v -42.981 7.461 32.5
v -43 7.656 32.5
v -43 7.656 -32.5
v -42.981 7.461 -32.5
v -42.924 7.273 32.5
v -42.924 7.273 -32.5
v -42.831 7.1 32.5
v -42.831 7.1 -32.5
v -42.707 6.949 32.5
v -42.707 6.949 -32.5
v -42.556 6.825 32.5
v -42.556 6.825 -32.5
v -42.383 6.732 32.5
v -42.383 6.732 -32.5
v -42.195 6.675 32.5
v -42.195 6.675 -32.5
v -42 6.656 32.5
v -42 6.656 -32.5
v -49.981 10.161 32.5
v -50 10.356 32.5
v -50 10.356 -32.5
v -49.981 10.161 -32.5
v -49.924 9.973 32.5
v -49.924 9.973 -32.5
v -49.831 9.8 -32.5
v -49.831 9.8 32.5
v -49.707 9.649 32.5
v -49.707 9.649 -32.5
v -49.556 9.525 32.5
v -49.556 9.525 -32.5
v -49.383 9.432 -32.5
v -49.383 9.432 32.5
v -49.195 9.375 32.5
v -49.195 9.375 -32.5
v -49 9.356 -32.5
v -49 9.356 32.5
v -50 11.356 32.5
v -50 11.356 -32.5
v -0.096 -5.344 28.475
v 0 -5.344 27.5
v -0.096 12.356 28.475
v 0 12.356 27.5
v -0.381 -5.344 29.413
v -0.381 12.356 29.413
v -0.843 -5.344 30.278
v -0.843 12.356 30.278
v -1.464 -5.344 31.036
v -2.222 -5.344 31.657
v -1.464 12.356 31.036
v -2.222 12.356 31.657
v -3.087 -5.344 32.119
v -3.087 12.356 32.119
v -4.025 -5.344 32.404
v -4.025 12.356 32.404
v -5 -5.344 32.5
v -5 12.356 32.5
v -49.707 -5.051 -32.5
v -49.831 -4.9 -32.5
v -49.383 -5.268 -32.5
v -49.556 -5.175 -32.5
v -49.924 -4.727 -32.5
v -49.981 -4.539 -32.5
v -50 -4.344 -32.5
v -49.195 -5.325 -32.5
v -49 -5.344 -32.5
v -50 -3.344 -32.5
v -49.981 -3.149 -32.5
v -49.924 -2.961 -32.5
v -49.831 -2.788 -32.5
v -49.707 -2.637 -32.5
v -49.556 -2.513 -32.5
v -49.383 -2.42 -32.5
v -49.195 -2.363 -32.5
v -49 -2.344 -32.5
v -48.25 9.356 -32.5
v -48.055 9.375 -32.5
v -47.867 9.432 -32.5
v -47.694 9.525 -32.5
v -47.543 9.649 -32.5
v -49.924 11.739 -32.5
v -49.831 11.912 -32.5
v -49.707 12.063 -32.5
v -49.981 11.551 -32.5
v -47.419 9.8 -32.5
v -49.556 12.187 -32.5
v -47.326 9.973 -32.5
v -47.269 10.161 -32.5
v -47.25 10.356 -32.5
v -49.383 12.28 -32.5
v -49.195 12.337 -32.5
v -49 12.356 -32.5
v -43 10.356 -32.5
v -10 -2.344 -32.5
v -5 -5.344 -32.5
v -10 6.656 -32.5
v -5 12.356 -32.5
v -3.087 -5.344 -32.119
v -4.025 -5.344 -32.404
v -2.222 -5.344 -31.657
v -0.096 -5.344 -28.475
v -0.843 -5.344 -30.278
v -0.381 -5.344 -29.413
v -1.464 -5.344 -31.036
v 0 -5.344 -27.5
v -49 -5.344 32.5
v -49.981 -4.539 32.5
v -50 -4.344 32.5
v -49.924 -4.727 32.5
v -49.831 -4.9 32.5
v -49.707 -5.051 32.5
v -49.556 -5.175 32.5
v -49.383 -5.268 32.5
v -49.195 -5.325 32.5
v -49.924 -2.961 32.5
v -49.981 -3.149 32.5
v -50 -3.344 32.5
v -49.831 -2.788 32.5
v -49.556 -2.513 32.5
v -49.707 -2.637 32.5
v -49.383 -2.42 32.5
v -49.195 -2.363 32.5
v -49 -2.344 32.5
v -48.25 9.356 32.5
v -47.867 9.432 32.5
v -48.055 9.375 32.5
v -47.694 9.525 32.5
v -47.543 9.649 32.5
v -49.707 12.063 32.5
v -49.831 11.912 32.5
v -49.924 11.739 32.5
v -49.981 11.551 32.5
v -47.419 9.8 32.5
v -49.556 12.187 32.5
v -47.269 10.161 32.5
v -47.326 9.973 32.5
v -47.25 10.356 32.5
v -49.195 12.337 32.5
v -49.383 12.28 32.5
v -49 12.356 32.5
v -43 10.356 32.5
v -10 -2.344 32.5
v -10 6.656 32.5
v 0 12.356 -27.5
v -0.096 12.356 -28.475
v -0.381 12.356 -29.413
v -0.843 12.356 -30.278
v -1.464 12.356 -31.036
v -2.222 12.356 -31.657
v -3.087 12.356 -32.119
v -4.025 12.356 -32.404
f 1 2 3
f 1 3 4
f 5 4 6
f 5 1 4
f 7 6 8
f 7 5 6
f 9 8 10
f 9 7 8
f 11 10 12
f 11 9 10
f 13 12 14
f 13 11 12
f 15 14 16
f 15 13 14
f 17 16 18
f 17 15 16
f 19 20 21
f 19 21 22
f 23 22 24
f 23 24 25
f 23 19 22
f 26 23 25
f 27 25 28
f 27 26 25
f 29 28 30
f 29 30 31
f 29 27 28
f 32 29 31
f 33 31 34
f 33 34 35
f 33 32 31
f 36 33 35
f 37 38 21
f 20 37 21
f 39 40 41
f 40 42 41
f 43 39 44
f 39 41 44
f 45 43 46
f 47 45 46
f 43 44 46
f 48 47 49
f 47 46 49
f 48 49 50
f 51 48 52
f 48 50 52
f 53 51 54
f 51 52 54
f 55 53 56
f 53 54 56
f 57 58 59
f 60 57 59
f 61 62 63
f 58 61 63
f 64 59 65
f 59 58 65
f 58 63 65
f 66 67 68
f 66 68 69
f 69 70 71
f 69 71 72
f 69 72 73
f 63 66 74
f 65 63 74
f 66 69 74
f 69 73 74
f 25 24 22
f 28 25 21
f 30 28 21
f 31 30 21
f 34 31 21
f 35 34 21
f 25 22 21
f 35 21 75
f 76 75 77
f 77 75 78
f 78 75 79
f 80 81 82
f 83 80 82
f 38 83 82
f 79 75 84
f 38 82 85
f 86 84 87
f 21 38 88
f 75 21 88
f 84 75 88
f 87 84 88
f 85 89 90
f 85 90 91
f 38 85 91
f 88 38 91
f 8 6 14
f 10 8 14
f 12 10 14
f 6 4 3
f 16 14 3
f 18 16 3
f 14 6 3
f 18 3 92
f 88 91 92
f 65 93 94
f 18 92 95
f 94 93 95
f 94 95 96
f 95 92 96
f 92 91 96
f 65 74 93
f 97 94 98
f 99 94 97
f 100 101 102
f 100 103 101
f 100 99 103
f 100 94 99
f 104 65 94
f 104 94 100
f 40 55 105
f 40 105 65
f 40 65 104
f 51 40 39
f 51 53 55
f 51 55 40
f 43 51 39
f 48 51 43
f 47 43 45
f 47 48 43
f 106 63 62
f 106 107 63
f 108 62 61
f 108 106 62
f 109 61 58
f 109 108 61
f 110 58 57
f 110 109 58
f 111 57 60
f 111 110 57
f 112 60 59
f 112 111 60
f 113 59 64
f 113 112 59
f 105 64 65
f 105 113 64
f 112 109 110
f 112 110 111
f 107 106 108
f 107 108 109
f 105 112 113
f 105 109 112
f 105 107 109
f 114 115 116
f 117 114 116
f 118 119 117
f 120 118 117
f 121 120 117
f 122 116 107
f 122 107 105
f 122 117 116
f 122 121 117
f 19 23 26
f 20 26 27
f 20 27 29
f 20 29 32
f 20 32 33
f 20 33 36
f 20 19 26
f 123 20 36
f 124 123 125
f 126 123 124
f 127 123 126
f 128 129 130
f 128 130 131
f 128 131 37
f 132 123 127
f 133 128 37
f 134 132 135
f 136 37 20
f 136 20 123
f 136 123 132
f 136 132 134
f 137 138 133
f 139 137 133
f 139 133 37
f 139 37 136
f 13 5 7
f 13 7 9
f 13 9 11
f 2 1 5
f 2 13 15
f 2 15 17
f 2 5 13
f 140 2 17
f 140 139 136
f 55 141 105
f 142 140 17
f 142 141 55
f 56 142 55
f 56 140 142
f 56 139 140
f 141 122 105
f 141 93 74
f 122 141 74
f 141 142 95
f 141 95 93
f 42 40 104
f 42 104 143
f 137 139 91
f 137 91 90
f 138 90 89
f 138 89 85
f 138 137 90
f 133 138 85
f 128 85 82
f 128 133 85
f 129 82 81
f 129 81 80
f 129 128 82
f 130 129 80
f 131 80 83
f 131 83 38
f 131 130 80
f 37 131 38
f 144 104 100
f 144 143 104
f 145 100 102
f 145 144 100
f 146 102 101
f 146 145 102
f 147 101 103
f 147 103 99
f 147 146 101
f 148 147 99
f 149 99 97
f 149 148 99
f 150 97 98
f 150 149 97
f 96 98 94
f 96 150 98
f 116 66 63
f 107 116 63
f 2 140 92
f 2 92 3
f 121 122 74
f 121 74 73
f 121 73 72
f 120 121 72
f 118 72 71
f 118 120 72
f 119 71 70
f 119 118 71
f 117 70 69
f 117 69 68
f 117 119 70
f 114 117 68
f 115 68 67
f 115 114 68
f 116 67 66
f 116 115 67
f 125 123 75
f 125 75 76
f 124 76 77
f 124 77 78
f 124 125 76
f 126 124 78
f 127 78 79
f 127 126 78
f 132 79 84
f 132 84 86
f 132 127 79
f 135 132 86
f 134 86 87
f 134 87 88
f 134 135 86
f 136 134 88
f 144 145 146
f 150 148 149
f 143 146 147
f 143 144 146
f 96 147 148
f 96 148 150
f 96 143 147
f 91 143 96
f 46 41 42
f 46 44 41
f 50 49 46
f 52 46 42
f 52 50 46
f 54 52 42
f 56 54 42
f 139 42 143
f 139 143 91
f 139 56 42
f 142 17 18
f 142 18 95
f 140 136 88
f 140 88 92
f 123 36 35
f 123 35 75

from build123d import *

# Parameters (mm, degrees)
F1_DEPTH = 32.5
F2_R     = 5


with BuildPart() as f1:
    # F0 (on Top) → F1 (new body, symmetric)
    with BuildSketch(Plane.XY):
        with BuildLine():
            Line((0, -5.344), (0, 12.356))
            Line((0, 12.356), (-49, 12.356))
            ThreePointArc((-49, 12.356), (-49.707107, 12.063107), (-50, 11.356))
            Line((-50, 11.356), (-50, 10.356))
            ThreePointArc((-50, 10.356), (-49.707107, 9.648893), (-49, 9.356))
            Line((-49, 9.356), (-48.25, 9.356))
            ThreePointArc((-48.25, 9.356), (-47.542893, 9.648893), (-47.25, 10.356))
            Line((-47.25, 10.356), (-43, 10.356))
            Line((-43, 10.356), (-43, 7.656))
            ThreePointArc((-43, 7.656), (-42.707107, 6.948893), (-42, 6.656))
            Line((-42, 6.656), (-10, 6.656))
            Line((-10, 6.656), (-10, -2.344))
            Line((-10, -2.344), (-49, -2.344))
            ThreePointArc((-49, -2.344), (-49.707107, -2.636893), (-50, -3.344))
            Line((-50, -3.344), (-50, -4.344))
            ThreePointArc((-50, -4.344), (-49.707107, -5.051107), (-49, -5.344))
            Line((-49, -5.344), (0, -5.344))
        make_face()
    extrude(amount=F1_DEPTH, both=True)

    # F2
    f2_edges = [f1.edges().sort_by_distance(p)[0] for p in [
        (0, 3.506, 32.5),
        (0, 3.506, -32.5),
    ]]
    fillet(f2_edges, radius=F2_R)


solid = f1.part
